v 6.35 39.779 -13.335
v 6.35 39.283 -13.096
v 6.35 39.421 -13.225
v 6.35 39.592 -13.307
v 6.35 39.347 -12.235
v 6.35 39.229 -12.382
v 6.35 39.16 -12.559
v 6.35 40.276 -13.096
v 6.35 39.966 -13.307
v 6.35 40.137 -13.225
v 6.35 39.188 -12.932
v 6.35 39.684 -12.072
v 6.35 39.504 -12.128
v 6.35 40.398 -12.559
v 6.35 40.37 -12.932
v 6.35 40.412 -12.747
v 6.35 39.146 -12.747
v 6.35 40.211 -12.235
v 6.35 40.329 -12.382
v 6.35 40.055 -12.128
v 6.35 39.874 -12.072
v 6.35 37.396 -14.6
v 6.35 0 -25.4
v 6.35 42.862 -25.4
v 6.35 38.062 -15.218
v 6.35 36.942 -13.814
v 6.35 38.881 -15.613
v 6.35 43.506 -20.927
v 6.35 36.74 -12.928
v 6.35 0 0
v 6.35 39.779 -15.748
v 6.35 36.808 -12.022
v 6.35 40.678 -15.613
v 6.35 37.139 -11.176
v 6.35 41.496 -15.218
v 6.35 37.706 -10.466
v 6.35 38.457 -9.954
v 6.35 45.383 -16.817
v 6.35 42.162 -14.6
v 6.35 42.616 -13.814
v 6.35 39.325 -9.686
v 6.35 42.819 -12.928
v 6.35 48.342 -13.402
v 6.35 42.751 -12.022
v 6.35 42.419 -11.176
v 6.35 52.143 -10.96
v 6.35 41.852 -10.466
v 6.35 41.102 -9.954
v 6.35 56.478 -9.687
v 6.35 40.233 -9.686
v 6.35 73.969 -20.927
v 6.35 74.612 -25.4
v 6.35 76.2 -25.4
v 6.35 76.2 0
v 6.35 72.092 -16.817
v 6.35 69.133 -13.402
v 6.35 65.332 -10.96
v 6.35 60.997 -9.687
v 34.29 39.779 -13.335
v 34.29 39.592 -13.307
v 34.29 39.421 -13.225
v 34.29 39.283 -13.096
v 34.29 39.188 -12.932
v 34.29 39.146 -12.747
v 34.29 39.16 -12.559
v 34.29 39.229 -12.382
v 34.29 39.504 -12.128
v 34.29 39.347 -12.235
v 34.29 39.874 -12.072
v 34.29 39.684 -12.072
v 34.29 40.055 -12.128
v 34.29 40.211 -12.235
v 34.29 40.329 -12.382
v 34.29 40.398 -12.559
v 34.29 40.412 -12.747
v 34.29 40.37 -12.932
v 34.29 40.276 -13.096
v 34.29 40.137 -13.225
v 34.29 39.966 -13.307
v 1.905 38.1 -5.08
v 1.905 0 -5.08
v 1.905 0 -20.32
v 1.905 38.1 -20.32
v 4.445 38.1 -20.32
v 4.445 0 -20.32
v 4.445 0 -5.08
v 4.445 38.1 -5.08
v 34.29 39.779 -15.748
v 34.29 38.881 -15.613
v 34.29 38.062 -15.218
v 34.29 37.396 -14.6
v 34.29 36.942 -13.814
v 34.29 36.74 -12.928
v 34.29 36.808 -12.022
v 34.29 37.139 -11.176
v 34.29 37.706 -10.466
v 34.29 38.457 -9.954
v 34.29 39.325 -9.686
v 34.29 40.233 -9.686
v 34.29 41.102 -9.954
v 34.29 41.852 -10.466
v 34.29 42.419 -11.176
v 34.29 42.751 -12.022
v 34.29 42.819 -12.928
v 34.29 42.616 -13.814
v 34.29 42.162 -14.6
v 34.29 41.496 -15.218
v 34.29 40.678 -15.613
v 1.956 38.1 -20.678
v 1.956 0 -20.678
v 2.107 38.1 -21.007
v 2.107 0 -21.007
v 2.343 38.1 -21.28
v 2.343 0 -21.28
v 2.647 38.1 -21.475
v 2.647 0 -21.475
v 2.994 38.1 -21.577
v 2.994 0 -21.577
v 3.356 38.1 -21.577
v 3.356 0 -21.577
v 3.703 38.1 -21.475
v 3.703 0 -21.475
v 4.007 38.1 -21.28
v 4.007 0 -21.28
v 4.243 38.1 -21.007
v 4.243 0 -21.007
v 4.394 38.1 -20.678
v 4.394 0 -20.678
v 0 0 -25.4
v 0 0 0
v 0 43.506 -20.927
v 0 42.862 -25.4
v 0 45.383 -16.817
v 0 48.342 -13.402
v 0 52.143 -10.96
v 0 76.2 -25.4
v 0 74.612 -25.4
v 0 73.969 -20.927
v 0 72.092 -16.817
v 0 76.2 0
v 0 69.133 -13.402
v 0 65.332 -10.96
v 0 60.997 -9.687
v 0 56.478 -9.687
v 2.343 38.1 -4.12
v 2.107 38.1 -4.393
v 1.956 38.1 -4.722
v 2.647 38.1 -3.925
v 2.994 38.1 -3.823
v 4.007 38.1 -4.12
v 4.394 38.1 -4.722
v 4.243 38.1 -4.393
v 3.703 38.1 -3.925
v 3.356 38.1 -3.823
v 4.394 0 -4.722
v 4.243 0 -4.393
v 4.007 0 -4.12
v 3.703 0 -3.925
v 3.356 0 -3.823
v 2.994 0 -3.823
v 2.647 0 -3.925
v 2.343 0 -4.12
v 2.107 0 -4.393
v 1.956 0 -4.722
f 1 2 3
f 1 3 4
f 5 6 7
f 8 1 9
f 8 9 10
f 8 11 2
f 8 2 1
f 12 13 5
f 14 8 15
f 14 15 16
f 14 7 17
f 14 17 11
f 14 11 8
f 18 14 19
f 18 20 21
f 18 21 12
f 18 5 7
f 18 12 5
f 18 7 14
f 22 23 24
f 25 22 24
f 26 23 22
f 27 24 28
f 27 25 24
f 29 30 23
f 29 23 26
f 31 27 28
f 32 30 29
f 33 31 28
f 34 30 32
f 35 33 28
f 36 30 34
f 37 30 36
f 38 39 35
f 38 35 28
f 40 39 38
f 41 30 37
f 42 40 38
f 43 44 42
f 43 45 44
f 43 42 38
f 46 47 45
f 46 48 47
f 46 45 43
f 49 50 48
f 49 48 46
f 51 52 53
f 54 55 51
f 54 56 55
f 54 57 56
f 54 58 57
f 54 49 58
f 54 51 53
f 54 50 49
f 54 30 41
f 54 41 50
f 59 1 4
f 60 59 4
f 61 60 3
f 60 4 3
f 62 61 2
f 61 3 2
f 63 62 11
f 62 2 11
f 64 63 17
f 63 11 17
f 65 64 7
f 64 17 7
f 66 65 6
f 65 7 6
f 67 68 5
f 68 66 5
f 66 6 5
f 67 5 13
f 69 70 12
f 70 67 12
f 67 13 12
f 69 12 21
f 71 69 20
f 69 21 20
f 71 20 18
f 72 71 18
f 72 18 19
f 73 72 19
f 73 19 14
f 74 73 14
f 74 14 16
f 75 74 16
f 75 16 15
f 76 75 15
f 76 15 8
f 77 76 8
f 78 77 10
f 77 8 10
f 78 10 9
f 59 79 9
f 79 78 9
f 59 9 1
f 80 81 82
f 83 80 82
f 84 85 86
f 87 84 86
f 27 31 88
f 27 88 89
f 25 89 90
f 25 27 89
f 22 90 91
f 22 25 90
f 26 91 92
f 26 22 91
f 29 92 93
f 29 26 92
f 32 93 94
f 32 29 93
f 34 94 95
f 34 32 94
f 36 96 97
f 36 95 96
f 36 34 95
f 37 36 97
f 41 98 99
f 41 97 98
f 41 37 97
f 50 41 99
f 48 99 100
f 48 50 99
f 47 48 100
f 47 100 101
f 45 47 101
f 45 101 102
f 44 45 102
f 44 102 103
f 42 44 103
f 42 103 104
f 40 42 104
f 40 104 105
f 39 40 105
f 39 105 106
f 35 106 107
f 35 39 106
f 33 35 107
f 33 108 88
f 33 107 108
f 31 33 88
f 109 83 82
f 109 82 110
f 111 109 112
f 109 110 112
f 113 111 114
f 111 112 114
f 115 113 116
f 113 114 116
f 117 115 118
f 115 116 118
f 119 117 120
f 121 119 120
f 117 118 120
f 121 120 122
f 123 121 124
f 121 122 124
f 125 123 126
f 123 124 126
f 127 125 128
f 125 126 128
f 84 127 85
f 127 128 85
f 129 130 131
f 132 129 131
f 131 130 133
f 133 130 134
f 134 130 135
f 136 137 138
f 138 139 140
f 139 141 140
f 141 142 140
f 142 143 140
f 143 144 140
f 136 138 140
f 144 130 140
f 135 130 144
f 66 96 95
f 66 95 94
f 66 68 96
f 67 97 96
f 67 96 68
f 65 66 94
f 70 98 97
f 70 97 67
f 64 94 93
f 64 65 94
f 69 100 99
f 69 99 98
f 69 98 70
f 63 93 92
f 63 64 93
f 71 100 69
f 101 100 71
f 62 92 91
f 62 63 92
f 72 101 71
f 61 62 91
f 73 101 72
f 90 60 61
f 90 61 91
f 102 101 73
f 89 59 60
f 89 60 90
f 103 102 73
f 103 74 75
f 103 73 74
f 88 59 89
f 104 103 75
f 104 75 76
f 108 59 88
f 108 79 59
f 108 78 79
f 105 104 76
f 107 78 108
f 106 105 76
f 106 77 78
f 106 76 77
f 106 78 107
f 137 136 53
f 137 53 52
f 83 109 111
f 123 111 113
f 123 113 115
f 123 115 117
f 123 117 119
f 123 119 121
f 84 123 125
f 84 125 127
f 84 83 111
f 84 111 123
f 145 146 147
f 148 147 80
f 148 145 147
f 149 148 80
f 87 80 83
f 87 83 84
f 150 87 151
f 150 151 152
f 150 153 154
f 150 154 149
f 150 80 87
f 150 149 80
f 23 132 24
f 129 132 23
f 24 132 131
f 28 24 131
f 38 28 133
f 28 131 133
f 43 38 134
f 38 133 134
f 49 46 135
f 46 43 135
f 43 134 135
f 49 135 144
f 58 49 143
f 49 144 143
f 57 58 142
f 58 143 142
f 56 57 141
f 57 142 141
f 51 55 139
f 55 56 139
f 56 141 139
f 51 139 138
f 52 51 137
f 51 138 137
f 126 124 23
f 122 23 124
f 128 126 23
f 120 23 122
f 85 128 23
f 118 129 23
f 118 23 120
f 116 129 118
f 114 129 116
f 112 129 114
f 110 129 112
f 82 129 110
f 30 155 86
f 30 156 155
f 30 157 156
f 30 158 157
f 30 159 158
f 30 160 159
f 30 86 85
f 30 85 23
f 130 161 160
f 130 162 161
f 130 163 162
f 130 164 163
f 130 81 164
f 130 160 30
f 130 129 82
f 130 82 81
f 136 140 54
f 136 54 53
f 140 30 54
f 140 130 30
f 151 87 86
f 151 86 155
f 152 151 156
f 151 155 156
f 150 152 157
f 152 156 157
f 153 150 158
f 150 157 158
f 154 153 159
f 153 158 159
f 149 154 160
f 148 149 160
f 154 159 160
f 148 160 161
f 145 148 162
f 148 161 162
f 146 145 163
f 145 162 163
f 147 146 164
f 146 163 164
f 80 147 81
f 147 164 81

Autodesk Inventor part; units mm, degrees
ref_plane "YZ Plane" through (0, 0, 0) normal (1, 0, 0) x (0, 1, 0)
ref_plane "XZ Plane" through (0, 0, 0) normal (0, 1, 0) x (-1, 0, 0)
ref_plane "XY Plane" through (0, 0, 0) normal (0, 0, 1) x (1, 0, 0)
sketch "Sketch1" plane through (0, 0, 0) normal (1, 0, 0) x (0, 1, 0)
  line L0 (0, 0) -> (76.2, 0)
  line L1 (76.2, 0) -> (76.2, -25.4)
  line L2 (76.2, -25.4) -> (0, -25.4)
  line L3 (0, -25.4) -> (0, 0)
  arc A0 (74.6125, -25.4) -> (42.8625, -25.4) centre (58.7375, -25.4) ccw
  dimension "d0" = 76.2
  dimension "d1" = 25.4
  dimension "d2" = 31.75
  dimension "d3" = 15.875
  dimension "d20" = 1.5875
extrude "Extrusion1" add sketch "Sketch1" along normal blind 6.35 contours L0 L1 L2 A0 L3
sketch "Sketch2" plane through (0, 0, -25.4) normal (0, -1, 0) x (1, 0, 0)
  line L0 (3.175, 21.59) -> (3.175, 3.81) construction
  line L1 (1.905, 20.32) -> (1.905, 5.08)
  line L2 (4.445, 5.08) -> (4.445, 20.32)
  arc A0 (4.445, 20.32) -> (1.905, 20.32) centre (3.175, 20.32) ccw
  arc A1 (1.905, 5.08) -> (4.445, 5.08) centre (3.175, 5.08) ccw
  line L3 (6.35, 25.4) -> (6.35, 0) projected
  line L4 (0, 25.4) -> (6.35, 25.4) projected
  point P0 (3.175, 12.7)
  dimension "d6" = 2.54
  dimension "d7" = 25.4
  dimension "d8" = 12.7
  dimension "d9" = 8.89
extrude "Extrusion2" cut sketch "Sketch2" against normal blind 38.1
sketch "Sketch4" plane through (6.35, 0, 0) normal (1, 0, 0) x (0, 0, -1)
  line L0 (5.08, 0) -> (5.08, 38.1) projected
  line L1 (0, 0) -> (25.4, 0) projected
  line L2 (25.4, 0) -> (25.4, 42.8625) projected
  arc A0 (25.4, 74.6125) -> (25.4, 42.8625) centre (25.4, 58.7375) ccw projected
  line L3 (25.4, 76.2) -> (0, 76.2) projected
  line L4 (0, 76.2) -> (0, 0) projected
  circle A1 centre (12.7, 39.7791) radius 0.635
  circle A2 centre (12.7, 39.7791) radius 3.048
  line L5 (25.4, 74.6125) -> (25.4, 76.2) projected
  dimension "d16" = 1.27
  dimension "d17" = 6.096
extrude "Extrusion4" add sketch "Sketch4" along normal blind 27.94 contours A2
equation "\"d8\" = 0.5 * d7"
properties part number "hook"
